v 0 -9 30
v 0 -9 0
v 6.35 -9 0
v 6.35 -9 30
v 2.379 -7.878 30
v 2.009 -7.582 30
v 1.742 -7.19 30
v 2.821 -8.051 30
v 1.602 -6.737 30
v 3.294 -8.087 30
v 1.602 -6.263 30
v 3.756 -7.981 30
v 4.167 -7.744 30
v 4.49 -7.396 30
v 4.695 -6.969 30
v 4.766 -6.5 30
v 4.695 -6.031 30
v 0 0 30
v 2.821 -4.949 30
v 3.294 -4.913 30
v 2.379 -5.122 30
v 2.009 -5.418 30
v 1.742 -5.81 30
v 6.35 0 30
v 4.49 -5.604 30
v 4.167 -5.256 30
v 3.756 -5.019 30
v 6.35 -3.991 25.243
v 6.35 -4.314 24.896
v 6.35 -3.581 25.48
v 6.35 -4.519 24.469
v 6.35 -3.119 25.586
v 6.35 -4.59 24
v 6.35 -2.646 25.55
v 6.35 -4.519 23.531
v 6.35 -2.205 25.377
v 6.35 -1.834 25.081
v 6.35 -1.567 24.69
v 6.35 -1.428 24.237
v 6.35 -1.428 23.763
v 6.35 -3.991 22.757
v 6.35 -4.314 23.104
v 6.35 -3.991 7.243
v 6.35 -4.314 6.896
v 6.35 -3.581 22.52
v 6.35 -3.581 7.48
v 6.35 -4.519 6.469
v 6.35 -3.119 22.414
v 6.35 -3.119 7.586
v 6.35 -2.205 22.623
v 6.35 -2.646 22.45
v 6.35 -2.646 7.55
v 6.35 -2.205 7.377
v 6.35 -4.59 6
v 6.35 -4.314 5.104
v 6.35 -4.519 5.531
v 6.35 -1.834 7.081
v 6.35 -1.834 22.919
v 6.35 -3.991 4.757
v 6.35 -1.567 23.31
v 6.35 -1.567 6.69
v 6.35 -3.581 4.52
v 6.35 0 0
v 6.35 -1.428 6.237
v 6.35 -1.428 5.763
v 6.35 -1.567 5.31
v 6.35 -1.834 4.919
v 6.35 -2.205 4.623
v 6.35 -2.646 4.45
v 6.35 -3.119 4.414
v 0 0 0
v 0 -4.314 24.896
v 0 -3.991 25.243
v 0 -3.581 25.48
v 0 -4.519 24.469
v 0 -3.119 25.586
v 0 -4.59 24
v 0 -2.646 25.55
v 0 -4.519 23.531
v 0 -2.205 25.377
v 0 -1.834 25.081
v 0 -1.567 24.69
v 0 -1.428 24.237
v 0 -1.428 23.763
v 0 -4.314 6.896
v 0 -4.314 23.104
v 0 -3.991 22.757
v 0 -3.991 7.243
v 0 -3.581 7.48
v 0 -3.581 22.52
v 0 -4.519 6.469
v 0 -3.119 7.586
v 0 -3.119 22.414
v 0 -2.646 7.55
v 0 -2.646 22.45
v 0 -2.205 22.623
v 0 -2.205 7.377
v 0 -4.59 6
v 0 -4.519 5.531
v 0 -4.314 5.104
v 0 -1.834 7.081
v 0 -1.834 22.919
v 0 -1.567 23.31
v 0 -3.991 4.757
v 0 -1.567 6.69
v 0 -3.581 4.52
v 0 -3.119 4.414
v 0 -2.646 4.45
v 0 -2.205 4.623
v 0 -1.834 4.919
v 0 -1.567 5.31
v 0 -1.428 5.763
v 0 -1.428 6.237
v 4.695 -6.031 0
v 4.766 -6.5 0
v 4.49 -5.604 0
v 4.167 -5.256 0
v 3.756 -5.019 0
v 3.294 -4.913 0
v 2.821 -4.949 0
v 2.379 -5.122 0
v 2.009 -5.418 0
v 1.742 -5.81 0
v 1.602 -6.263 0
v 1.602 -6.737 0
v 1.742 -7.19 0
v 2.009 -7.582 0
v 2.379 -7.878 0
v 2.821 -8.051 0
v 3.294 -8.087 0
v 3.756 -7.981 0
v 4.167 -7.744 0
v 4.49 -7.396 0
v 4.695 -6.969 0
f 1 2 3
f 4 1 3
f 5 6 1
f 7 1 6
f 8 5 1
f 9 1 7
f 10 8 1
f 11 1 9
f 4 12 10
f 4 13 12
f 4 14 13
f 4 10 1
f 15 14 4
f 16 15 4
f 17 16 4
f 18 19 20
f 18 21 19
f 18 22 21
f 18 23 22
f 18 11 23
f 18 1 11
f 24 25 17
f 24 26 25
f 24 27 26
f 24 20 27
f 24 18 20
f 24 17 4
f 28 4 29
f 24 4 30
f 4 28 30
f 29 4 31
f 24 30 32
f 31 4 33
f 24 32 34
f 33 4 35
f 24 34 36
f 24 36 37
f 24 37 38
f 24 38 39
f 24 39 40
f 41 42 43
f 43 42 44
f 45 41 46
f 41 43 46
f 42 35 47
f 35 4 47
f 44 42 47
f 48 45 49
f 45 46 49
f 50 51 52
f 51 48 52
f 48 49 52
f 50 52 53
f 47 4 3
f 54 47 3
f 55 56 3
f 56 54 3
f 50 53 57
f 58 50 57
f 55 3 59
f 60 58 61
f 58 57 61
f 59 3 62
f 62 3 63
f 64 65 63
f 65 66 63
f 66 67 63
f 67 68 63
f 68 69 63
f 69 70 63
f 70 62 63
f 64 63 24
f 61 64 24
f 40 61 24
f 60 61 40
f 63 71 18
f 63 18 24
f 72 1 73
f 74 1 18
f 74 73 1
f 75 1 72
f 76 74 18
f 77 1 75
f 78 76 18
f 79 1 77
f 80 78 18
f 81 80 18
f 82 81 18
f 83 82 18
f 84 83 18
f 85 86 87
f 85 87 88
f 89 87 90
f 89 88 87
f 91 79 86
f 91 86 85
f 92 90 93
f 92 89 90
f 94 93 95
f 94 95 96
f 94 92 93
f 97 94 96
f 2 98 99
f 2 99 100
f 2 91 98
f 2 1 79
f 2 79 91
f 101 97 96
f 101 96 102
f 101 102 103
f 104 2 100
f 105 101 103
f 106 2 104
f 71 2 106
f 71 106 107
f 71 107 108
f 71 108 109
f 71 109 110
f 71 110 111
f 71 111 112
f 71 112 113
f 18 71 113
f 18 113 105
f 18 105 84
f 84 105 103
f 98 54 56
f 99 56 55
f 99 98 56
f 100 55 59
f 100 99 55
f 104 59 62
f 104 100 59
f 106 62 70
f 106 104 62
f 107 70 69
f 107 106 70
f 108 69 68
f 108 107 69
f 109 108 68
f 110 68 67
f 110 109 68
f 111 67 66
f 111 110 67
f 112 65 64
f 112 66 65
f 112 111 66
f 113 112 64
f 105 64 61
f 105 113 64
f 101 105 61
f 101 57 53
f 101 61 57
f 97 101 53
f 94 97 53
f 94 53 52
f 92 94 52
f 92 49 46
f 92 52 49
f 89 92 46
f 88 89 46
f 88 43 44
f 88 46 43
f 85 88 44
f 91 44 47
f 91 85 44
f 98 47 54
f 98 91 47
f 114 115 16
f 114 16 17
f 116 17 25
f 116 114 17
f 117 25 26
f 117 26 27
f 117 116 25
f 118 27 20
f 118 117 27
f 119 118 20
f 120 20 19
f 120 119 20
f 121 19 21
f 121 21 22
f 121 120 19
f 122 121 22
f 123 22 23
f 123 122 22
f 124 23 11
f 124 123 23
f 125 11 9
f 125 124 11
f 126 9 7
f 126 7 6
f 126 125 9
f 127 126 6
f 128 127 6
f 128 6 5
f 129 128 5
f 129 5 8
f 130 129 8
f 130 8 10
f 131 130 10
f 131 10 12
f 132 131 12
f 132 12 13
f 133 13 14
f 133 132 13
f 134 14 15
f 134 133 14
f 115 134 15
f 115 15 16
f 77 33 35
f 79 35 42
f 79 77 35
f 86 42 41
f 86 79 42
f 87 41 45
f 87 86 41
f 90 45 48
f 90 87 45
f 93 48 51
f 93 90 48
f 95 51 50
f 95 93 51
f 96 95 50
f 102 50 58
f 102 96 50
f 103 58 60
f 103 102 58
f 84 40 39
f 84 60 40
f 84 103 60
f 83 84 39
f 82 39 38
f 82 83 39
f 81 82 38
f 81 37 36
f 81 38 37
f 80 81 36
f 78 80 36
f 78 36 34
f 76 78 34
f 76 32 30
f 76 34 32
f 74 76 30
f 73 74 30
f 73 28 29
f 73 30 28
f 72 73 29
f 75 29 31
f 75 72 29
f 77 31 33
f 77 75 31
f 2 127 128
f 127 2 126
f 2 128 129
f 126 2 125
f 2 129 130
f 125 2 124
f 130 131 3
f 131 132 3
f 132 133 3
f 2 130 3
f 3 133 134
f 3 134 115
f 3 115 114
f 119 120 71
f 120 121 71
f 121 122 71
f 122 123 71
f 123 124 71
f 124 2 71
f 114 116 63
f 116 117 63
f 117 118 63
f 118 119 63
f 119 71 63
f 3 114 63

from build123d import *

# Parameters (mm, degrees)
SKETCH1_W           = 6.35
SKETCH1_H           = 9
SKETCH1_R           = 1.591
BOSS_EXTRUDE1_DEPTH = 30
SKETCH2_R           = 1.59
CUT_EXTRUDE1_DEPTH  = 30


with BuildPart() as part:
    # Sketch1 → Boss-Extrude1 (new body)
    with BuildSketch(Plane.XY):
        with Locations((3.175, -4.5)):
            Rectangle(SKETCH1_W, SKETCH1_H)
        with Locations((3.175, -6.5)):
            Circle(SKETCH1_R, mode=Mode.SUBTRACT)
    extrude(amount=BOSS_EXTRUDE1_DEPTH)

    # Sketch2 → Cut-Extrude1 (cut)
    with BuildSketch(Plane(origin=(0, 0, 0), x_dir=(0, 0, -1), z_dir=(1, 0, 0))):
        with Locations((-24, -3)):
            Circle(SKETCH2_R)
        with Locations((-6, -3)):
            Circle(SKETCH2_R)
    extrude(amount=CUT_EXTRUDE1_DEPTH, mode=Mode.SUBTRACT)


solid = part.part
